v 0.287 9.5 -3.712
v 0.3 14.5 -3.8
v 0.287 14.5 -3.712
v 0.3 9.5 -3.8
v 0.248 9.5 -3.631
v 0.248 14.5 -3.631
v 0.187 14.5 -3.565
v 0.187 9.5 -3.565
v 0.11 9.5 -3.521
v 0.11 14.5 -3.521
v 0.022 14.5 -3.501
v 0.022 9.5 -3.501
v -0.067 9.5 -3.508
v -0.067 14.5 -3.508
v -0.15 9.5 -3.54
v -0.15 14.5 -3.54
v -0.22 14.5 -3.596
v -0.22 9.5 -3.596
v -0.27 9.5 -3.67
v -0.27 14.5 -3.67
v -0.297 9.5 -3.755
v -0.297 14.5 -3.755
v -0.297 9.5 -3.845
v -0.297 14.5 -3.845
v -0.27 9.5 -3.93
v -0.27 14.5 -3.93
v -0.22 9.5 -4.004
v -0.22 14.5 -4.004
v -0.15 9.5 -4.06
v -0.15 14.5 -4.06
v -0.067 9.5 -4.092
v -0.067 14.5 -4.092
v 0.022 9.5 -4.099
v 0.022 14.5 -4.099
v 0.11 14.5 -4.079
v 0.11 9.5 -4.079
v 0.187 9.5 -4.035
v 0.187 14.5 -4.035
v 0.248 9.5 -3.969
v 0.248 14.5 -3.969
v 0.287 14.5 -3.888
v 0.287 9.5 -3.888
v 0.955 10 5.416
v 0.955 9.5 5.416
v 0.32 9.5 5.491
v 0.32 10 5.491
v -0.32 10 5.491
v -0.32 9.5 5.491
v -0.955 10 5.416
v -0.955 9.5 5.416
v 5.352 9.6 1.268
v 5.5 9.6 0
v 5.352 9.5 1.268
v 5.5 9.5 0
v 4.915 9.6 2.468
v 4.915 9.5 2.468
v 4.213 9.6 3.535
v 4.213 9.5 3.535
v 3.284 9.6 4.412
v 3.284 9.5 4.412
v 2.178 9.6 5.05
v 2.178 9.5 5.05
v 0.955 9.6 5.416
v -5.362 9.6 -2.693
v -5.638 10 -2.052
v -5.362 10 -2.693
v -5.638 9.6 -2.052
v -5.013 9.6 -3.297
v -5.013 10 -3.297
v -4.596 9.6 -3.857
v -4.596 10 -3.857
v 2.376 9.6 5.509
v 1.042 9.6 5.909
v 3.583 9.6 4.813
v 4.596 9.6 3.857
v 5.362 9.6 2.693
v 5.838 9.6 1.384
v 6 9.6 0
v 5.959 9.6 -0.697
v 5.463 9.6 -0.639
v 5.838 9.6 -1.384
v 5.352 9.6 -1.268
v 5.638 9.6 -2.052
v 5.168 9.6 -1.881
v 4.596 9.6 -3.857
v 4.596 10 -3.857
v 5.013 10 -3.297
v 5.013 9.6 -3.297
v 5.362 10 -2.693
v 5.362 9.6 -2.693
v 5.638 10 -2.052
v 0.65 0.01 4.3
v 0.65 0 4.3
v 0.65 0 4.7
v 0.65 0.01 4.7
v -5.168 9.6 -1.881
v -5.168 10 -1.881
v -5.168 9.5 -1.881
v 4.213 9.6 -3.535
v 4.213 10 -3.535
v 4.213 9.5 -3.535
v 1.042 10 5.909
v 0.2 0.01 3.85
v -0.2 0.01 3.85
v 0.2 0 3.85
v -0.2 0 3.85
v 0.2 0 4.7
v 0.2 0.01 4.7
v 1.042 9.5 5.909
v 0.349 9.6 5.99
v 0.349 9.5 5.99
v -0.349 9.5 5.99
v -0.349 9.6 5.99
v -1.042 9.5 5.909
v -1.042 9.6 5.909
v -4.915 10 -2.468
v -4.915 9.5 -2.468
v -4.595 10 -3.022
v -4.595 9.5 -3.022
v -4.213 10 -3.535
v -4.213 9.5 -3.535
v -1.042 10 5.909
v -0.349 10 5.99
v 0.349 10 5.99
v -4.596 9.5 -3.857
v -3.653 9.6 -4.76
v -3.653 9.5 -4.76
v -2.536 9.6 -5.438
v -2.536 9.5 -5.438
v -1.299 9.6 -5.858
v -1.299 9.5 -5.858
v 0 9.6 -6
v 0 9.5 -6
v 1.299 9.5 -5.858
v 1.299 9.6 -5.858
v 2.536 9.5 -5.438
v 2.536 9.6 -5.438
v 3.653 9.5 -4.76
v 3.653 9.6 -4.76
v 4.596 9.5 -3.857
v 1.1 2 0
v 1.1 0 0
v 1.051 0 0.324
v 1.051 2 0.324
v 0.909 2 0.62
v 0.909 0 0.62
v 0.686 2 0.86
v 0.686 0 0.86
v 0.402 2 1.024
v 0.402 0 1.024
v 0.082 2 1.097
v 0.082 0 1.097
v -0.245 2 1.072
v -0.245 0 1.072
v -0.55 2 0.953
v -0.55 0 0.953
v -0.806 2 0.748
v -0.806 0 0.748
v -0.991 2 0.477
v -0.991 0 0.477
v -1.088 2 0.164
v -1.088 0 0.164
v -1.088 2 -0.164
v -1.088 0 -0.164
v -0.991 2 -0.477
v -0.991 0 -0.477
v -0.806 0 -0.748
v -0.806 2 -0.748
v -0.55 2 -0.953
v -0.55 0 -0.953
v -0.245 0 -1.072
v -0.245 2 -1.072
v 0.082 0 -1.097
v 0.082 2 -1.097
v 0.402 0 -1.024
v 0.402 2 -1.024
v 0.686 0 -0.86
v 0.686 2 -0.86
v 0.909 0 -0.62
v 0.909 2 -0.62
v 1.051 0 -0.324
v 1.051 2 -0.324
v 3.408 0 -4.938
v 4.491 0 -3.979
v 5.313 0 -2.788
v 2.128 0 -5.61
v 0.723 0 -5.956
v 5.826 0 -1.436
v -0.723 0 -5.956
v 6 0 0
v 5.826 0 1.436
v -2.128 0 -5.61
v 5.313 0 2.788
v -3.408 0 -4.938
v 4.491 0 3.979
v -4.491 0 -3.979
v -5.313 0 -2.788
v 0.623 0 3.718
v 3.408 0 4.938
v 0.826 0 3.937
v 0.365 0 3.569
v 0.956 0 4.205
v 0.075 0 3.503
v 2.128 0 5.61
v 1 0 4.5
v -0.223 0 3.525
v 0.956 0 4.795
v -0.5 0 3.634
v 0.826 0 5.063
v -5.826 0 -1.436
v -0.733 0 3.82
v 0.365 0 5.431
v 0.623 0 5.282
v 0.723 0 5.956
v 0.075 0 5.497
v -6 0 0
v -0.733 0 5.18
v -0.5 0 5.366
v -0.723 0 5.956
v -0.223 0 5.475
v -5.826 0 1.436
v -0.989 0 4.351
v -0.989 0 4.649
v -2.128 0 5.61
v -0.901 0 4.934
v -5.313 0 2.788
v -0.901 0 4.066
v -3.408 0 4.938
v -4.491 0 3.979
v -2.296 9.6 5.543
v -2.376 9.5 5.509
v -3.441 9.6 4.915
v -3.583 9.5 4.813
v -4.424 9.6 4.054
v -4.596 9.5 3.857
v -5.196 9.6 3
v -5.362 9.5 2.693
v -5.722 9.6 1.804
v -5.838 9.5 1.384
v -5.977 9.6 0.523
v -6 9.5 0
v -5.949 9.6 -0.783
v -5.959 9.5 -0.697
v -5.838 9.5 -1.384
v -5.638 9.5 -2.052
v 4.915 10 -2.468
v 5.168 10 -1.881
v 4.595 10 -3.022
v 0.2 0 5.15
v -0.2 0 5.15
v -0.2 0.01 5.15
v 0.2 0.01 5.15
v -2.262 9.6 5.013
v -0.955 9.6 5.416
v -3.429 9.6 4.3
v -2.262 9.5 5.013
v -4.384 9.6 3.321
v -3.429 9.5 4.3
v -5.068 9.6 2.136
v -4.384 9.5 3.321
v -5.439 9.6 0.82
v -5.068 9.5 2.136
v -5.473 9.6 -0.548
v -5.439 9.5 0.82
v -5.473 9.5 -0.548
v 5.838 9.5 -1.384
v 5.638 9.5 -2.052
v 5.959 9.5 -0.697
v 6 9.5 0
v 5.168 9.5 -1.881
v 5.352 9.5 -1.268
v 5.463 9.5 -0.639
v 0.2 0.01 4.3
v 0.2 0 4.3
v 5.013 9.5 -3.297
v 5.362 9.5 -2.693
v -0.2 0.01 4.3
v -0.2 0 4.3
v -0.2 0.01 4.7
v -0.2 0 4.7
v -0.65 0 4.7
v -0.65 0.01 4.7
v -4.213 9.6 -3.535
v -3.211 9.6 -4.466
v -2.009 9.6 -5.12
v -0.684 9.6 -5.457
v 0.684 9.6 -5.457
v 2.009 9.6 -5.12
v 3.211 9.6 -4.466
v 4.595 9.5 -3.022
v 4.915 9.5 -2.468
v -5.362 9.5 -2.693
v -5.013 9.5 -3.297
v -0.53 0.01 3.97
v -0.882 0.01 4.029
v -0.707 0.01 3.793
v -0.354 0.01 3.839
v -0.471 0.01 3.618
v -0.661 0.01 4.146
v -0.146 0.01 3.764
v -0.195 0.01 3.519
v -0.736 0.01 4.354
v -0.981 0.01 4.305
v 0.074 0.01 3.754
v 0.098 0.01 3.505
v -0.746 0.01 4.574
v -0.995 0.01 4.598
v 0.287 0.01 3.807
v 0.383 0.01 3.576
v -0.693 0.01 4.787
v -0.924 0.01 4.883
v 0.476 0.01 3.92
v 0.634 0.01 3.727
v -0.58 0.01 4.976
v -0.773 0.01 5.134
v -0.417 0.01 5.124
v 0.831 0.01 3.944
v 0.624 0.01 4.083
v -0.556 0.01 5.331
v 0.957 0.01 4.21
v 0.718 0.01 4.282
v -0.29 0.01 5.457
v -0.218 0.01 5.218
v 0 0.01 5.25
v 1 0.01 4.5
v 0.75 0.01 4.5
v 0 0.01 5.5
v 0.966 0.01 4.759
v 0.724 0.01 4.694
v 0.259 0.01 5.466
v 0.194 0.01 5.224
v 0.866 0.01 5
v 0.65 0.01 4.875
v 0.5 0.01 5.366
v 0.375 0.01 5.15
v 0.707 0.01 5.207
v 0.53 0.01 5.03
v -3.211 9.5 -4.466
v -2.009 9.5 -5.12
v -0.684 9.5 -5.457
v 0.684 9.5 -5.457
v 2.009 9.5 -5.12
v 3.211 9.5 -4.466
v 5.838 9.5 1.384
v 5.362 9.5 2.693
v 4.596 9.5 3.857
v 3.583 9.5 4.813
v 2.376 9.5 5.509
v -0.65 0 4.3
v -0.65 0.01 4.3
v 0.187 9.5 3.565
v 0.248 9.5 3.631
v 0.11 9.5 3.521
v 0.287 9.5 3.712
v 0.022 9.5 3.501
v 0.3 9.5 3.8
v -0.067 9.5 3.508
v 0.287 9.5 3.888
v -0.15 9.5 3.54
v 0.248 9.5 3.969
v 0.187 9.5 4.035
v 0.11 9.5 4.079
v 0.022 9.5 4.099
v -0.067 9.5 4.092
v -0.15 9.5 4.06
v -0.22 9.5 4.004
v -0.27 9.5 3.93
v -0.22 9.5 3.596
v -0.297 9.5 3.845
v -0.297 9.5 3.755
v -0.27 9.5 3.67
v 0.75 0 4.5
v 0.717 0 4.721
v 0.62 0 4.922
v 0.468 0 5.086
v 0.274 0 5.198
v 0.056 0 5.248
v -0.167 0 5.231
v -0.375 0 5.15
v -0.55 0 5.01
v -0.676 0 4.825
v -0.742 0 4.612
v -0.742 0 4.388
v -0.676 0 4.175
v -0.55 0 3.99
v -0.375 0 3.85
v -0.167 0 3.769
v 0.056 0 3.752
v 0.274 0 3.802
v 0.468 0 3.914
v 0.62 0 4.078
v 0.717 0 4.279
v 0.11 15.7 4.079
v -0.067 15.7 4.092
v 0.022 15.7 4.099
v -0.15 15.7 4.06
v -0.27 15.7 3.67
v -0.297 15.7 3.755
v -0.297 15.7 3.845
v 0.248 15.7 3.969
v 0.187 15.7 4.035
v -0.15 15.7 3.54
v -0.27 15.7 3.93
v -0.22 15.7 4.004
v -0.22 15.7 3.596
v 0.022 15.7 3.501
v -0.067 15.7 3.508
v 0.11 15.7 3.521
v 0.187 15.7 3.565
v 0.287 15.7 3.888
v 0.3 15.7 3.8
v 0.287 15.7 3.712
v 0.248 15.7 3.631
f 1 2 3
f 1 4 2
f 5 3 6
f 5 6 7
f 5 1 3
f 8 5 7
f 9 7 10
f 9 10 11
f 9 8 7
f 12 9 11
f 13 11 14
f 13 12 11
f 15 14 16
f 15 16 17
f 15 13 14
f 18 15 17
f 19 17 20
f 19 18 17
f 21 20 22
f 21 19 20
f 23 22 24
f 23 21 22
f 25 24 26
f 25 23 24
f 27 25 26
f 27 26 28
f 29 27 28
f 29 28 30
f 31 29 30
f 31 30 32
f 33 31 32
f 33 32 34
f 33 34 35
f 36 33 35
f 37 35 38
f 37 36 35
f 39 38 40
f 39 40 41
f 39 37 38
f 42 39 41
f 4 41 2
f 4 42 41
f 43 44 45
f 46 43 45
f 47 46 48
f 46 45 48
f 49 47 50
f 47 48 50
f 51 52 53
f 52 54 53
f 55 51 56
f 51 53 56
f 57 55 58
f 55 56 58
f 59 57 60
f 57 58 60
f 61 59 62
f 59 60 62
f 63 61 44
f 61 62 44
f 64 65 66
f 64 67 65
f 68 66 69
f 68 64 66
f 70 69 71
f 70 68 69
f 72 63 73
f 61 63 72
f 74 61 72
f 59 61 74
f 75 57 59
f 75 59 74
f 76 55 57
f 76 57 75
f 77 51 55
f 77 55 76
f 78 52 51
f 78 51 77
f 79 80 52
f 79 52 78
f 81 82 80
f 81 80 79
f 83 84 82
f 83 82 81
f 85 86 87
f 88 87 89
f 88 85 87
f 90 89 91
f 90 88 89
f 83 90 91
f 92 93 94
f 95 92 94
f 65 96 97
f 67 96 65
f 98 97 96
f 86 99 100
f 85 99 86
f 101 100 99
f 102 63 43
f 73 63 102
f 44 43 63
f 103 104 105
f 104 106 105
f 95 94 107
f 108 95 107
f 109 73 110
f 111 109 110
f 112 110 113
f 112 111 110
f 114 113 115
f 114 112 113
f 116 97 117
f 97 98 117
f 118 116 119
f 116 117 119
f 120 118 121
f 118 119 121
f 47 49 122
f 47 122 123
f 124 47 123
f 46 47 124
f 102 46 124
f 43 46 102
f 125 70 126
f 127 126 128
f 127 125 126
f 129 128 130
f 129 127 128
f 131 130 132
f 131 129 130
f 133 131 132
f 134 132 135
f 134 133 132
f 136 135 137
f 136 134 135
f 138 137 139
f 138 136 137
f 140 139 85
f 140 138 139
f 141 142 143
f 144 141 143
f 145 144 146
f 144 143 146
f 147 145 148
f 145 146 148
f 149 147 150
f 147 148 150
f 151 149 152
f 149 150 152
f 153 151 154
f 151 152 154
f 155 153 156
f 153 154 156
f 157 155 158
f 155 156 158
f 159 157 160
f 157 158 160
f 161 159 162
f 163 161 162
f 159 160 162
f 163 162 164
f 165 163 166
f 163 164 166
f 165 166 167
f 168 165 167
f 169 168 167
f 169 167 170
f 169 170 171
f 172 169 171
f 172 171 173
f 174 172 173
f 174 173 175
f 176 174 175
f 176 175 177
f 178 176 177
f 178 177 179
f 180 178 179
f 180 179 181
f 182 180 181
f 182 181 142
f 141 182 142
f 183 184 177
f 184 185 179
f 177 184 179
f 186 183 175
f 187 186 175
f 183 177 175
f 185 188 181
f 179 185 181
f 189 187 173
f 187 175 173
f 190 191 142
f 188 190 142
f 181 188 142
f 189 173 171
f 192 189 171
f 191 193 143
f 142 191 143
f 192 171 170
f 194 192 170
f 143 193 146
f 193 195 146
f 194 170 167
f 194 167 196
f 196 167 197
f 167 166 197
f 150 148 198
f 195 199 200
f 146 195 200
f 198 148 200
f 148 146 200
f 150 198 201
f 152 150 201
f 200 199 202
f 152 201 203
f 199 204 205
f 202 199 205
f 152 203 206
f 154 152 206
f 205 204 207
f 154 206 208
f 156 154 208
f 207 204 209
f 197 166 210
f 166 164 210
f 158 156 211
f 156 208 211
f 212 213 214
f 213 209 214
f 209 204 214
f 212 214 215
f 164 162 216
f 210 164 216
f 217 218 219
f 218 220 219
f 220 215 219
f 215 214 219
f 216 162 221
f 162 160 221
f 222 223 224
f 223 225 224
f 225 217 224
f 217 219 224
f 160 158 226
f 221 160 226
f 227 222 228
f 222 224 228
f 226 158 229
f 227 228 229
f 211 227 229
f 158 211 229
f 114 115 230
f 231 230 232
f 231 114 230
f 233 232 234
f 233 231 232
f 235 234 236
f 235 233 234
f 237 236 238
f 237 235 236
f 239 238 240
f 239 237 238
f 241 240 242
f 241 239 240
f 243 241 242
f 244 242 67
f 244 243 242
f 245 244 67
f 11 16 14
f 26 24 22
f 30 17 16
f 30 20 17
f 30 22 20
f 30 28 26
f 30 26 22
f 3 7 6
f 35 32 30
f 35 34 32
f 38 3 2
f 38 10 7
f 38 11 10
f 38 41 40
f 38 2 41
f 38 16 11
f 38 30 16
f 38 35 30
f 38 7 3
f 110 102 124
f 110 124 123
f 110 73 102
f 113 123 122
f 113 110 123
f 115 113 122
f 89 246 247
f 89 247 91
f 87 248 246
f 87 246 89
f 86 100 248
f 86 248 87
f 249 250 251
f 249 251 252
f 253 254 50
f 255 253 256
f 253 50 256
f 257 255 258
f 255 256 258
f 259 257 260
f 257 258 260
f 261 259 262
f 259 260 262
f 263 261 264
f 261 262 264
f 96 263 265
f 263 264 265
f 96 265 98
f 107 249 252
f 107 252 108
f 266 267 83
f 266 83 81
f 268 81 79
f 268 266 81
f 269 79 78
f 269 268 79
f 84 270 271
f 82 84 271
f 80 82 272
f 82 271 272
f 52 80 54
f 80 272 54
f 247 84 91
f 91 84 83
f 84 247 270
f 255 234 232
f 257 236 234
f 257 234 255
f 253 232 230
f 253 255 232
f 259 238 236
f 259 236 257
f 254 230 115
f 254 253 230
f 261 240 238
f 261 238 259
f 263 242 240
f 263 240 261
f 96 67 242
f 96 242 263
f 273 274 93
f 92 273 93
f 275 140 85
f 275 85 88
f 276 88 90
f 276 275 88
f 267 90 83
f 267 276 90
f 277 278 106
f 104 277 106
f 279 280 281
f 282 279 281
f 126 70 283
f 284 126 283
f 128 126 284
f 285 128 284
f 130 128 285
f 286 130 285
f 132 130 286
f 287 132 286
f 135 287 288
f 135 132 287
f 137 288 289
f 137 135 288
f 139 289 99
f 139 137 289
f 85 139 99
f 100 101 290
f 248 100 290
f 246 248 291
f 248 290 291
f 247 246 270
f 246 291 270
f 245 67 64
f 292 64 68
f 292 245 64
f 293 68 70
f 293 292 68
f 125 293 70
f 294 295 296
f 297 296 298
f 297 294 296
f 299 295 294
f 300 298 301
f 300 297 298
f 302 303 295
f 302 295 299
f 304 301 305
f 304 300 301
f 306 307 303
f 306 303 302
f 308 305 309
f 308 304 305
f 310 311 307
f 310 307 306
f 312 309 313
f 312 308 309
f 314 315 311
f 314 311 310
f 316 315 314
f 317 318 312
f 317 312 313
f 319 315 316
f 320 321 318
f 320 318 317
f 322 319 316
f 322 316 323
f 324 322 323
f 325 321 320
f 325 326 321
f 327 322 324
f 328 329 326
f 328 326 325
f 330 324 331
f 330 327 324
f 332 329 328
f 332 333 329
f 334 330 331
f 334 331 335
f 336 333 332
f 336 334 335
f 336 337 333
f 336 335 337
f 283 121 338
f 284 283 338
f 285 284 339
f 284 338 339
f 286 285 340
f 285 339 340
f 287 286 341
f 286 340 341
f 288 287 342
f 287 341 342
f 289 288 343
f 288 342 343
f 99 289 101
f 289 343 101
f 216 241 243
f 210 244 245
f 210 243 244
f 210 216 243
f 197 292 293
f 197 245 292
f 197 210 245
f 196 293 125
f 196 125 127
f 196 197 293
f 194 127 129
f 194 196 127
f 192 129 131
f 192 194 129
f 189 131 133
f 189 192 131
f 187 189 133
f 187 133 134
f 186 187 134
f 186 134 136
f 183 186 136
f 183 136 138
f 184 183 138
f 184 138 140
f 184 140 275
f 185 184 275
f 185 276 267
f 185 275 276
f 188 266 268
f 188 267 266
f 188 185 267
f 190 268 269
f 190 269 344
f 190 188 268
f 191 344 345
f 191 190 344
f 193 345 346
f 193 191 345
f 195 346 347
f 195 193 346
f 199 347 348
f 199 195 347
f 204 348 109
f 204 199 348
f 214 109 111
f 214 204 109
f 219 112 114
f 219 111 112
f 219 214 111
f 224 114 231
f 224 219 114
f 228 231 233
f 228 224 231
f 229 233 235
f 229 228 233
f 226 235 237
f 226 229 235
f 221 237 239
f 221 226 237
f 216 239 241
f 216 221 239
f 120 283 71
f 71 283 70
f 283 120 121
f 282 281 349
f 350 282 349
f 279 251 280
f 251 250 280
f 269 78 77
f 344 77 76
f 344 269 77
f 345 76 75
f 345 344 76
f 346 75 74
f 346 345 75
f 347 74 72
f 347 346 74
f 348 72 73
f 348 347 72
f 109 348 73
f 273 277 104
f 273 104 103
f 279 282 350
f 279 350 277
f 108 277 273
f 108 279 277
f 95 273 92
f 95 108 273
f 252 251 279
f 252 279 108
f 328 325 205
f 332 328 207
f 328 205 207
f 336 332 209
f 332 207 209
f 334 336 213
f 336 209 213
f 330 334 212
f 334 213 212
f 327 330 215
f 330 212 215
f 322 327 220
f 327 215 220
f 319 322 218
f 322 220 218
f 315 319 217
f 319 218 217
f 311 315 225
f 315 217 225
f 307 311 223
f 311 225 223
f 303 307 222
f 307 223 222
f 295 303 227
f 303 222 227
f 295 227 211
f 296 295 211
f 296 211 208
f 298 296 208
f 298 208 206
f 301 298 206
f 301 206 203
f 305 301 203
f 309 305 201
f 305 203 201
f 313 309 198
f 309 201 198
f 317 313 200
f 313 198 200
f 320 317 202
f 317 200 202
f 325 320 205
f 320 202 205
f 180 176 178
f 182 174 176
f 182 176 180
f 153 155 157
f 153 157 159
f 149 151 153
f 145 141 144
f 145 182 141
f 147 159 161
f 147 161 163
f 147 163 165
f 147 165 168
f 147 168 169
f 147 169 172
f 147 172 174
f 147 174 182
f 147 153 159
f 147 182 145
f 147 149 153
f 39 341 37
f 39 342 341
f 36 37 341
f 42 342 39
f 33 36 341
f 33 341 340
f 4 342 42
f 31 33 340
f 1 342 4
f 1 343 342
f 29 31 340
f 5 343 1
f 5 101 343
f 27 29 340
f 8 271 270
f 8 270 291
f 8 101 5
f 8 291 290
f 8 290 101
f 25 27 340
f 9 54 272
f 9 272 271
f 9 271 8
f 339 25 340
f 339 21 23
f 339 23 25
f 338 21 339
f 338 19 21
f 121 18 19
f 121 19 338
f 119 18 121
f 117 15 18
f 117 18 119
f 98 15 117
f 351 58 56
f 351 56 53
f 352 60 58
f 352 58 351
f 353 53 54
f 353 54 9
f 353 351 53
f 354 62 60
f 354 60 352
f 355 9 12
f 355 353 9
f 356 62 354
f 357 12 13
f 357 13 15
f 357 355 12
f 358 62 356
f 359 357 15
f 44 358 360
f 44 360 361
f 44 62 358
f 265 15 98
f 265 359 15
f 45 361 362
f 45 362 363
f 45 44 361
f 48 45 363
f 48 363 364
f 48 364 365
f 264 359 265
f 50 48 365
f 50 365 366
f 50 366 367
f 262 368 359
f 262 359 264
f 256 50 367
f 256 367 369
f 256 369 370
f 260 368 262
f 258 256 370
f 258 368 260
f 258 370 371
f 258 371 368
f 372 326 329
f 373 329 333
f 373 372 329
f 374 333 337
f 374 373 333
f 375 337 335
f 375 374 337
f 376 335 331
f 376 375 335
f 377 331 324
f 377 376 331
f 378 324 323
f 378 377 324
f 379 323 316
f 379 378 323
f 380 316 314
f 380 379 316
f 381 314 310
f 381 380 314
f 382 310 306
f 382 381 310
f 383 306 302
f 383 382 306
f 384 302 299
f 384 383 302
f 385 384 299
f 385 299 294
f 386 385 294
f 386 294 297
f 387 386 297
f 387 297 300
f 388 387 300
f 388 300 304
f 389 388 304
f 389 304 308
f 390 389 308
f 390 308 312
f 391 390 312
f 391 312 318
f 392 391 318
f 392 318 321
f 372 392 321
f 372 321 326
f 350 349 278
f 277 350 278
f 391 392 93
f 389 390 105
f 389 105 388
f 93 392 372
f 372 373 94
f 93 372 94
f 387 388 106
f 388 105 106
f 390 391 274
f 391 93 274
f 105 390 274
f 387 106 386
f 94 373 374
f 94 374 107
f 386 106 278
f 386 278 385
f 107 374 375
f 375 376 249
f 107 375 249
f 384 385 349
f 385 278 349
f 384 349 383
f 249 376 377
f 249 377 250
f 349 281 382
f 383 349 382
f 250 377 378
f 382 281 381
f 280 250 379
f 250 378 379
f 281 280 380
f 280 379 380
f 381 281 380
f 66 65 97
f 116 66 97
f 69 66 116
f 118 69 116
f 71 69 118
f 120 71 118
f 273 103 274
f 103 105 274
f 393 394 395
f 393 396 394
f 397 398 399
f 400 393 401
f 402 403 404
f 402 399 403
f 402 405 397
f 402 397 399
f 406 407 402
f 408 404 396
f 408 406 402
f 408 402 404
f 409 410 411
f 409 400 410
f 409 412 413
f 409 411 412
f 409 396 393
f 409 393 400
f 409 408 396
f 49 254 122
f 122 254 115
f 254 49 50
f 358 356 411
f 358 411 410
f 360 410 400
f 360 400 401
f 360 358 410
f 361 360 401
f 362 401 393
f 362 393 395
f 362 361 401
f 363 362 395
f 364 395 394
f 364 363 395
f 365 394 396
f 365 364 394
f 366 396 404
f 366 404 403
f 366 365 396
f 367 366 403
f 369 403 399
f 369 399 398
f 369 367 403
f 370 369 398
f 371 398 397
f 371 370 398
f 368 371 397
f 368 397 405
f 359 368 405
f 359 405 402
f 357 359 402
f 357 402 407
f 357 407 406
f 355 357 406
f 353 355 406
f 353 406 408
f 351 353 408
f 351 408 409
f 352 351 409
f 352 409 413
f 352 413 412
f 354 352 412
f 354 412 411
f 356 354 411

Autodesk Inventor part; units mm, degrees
ref_plane "YZ Plane" through (0, 0, 0) normal (1, 0, 0) x (0, 1, 0)
ref_plane "XZ Plane" through (0, 0, 0) normal (0, 1, 0) x (-1, 0, 0)
ref_plane "XY Plane" through (0, 0, 0) normal (0, 0, 1) x (1, 0, 0)
sketch "Esboço1" plane through (0, 0, 0) normal (0, 1, 0) x (-1, 0, 0)
  circle A0 centre (0, 0) radius 6
  dimension "d0" = 12
extrude "Extrusão1" add sketch "Esboço1" along normal blind 9.5
sketch "Esboço2" plane through (0, 9.5, 0) normal (0, 1, 0) x (1, 0, 0)
  line L0 (0, 0) -> (0, 3.8)
  circle A0 centre (0, 3.8) radius 0.3
  dimension "d3" = 3.8
  dimension "d4" = 0.6
extrude "Extrusão2" add sketch "Esboço2" along normal blind 5
sketch "Esboço3" plane through (0, 9.5, 0) normal (0, 1, 0) x (1, 0, 0)
  circle A0 centre (0, 3.8) radius 0.3 projected
  line L0 (0, 3.8) -> (0, -3.8)
  circle A1 centre (0, -3.8) radius 0.3
  point P0 (0, 0)
  dimension "d7" = 7.6
extrude "Extrusão3" add sketch "Esboço3" along normal blind 6.2 contours A1
sketch "Esboço4" plane through (0, 9.5, 0) normal (0, 1, 0) x (1, 0, 0)
  line L0 (-0.9551, -5.4164) -> (-1.0419, -5.9088)
  circle A0 centre (0, 0) radius 6 projected
  line L1 (0, 0) -> (6, 0) construction
  line L2 (0.9551, -5.4164) -> (1.0419, -5.9088)
  arc A1 (-1.0419, -5.9088) -> (1.0419, -5.9088) centre (0, 0) ccw
  line L3 (0, -6) -> (0, -5.5)
  line L4 (1.0419, -5.9088) -> (0.9551, -5.4164)
  line L5 (-1.0419, -5.9088) -> (-0.9551, -5.4164)
  arc A2 (-0.9551, -5.4164) -> (0.9551, -5.4164) centre (0, 0) ccw
  line L6 (5.1683, 1.8811) -> (5.6382, 2.0521)
  line L7 (4.2132, 3.5353) -> (4.5963, 3.8567)
  arc A3 (5.6382, 2.0521) -> (4.5963, 3.8567) centre (0, 0) ccw
  line L8 (5.1962, 3) -> (4.7631, 2.75)
  line L9 (4.5963, 3.8567) -> (4.2132, 3.5353)
  line L10 (5.6382, 2.0521) -> (5.1683, 1.8811)
  arc A4 (5.1683, 1.8811) -> (4.2132, 3.5353) centre (0, 0) ccw
  line L11 (-4.2132, 3.5353) -> (-4.5963, 3.8567)
  line L12 (-5.1683, 1.8811) -> (-5.6382, 2.0521)
  arc A5 (-4.5963, 3.8567) -> (-5.6382, 2.0521) centre (0, 0) ccw
  line L13 (-5.1962, 3) -> (-4.7631, 2.75)
  line L14 (-5.6382, 2.0521) -> (-5.1683, 1.8811)
  line L15 (-4.5963, 3.8567) -> (-4.2132, 3.5353)
  arc A6 (-4.2132, 3.5353) -> (-5.1683, 1.8811) centre (0, 0) ccw
  dimension "d10" = 100
  dimension "d11" = 0.5
  dimension "d12" = 0.5
  dimension "d13" = 0.5
  dimension "d16" = 360
extrude "Extrusão4" add sketch "Esboço4" along normal blind 0.5 contours A2 L3 A0 L0 | A2 L2 A0 L3 | A0 L13 A6 L12 | A0 L11 A6 L13 | A0 L8 A4 L7 | L6 A4 L8 A0
sketch "Esboço5" plane through (0, 0, 0) normal (0, -1, 0) x (1, 0, 0)
  circle A0 centre (0, 0) radius 1.1
  dimension "d20" = 2.2
extrude "Extrusão5" cut sketch "Esboço5" against normal blind 2
sketch "Esboço6" plane through (0, 0, 0) normal (0, -1, 0) x (1, 0, 0)
  circle A0 centre (0, 0) radius 6 projected
  line L0 (0, 6) -> (0, 4.5)
  circle A1 centre (0, 4.5) radius 1
  circle A2 centre (0, 4.5) radius 0.75
  line L1 (0, 5.25) -> (0, 5.15)
  line L2 (0, 5.15) -> (-0.2, 5.15)
  line L3 (-0.2, 5.15) -> (-0.2, 4.7)
  line L4 (-0.2, 4.7) -> (-0.65, 4.7)
  line L5 (-0.65, 4.7) -> (-0.65, 4.3)
  line L6 (-0.65, 4.3) -> (-0.2, 4.3)
  line L7 (-0.2, 4.3) -> (-0.2, 3.85)
  line L8 (-0.2, 3.85) -> (0.2, 3.85)
  line L9 (0.2, 3.85) -> (0.2, 4.3)
  line L10 (0.2, 4.3) -> (0.65, 4.3)
  line L11 (0.65, 4.3) -> (0.65, 4.7)
  line L12 (0.65, 4.7) -> (0.2, 4.7)
  line L13 (0, 5.15) -> (0.2, 5.15)
  line L14 (0.2, 5.15) -> (0.2, 4.7)
  dimension "d25" = 1.5
  dimension "d23" = 1.5
  dimension "d24" = 2
  dimension "d26" = 0.1
  dimension "d27" = 0.2
  dimension "d28" = 0.45
  dimension "d29" = 0.45
  dimension "d30" = 0.4
  dimension "d31" = 0.45
  dimension "d32" = 0.4
  dimension "d33" = 0.45
  dimension "d34" = 0.2
extrude "Extrusão6" cut sketch "Esboço6" against normal blind 0.01 contours L13 L14 L12 L11 L10 L9 L8 L7 L6 L5 L4 L3 L2 | A1
sketch "Esboço7" plane through (0, 9.5, 0) normal (0, 1, 0) x (1, 0, 0)
  circle A0 centre (0, 0) radius 1.1 projected
  circle A1 centre (0, 0) radius 6
  circle A2 centre (0, 0) radius 5.5
extrude "Extrusão7" add sketch "Esboço7" along normal blind 0.1 contours A1
properties part number "Buzzer 5v" material "Plástico PBT"
